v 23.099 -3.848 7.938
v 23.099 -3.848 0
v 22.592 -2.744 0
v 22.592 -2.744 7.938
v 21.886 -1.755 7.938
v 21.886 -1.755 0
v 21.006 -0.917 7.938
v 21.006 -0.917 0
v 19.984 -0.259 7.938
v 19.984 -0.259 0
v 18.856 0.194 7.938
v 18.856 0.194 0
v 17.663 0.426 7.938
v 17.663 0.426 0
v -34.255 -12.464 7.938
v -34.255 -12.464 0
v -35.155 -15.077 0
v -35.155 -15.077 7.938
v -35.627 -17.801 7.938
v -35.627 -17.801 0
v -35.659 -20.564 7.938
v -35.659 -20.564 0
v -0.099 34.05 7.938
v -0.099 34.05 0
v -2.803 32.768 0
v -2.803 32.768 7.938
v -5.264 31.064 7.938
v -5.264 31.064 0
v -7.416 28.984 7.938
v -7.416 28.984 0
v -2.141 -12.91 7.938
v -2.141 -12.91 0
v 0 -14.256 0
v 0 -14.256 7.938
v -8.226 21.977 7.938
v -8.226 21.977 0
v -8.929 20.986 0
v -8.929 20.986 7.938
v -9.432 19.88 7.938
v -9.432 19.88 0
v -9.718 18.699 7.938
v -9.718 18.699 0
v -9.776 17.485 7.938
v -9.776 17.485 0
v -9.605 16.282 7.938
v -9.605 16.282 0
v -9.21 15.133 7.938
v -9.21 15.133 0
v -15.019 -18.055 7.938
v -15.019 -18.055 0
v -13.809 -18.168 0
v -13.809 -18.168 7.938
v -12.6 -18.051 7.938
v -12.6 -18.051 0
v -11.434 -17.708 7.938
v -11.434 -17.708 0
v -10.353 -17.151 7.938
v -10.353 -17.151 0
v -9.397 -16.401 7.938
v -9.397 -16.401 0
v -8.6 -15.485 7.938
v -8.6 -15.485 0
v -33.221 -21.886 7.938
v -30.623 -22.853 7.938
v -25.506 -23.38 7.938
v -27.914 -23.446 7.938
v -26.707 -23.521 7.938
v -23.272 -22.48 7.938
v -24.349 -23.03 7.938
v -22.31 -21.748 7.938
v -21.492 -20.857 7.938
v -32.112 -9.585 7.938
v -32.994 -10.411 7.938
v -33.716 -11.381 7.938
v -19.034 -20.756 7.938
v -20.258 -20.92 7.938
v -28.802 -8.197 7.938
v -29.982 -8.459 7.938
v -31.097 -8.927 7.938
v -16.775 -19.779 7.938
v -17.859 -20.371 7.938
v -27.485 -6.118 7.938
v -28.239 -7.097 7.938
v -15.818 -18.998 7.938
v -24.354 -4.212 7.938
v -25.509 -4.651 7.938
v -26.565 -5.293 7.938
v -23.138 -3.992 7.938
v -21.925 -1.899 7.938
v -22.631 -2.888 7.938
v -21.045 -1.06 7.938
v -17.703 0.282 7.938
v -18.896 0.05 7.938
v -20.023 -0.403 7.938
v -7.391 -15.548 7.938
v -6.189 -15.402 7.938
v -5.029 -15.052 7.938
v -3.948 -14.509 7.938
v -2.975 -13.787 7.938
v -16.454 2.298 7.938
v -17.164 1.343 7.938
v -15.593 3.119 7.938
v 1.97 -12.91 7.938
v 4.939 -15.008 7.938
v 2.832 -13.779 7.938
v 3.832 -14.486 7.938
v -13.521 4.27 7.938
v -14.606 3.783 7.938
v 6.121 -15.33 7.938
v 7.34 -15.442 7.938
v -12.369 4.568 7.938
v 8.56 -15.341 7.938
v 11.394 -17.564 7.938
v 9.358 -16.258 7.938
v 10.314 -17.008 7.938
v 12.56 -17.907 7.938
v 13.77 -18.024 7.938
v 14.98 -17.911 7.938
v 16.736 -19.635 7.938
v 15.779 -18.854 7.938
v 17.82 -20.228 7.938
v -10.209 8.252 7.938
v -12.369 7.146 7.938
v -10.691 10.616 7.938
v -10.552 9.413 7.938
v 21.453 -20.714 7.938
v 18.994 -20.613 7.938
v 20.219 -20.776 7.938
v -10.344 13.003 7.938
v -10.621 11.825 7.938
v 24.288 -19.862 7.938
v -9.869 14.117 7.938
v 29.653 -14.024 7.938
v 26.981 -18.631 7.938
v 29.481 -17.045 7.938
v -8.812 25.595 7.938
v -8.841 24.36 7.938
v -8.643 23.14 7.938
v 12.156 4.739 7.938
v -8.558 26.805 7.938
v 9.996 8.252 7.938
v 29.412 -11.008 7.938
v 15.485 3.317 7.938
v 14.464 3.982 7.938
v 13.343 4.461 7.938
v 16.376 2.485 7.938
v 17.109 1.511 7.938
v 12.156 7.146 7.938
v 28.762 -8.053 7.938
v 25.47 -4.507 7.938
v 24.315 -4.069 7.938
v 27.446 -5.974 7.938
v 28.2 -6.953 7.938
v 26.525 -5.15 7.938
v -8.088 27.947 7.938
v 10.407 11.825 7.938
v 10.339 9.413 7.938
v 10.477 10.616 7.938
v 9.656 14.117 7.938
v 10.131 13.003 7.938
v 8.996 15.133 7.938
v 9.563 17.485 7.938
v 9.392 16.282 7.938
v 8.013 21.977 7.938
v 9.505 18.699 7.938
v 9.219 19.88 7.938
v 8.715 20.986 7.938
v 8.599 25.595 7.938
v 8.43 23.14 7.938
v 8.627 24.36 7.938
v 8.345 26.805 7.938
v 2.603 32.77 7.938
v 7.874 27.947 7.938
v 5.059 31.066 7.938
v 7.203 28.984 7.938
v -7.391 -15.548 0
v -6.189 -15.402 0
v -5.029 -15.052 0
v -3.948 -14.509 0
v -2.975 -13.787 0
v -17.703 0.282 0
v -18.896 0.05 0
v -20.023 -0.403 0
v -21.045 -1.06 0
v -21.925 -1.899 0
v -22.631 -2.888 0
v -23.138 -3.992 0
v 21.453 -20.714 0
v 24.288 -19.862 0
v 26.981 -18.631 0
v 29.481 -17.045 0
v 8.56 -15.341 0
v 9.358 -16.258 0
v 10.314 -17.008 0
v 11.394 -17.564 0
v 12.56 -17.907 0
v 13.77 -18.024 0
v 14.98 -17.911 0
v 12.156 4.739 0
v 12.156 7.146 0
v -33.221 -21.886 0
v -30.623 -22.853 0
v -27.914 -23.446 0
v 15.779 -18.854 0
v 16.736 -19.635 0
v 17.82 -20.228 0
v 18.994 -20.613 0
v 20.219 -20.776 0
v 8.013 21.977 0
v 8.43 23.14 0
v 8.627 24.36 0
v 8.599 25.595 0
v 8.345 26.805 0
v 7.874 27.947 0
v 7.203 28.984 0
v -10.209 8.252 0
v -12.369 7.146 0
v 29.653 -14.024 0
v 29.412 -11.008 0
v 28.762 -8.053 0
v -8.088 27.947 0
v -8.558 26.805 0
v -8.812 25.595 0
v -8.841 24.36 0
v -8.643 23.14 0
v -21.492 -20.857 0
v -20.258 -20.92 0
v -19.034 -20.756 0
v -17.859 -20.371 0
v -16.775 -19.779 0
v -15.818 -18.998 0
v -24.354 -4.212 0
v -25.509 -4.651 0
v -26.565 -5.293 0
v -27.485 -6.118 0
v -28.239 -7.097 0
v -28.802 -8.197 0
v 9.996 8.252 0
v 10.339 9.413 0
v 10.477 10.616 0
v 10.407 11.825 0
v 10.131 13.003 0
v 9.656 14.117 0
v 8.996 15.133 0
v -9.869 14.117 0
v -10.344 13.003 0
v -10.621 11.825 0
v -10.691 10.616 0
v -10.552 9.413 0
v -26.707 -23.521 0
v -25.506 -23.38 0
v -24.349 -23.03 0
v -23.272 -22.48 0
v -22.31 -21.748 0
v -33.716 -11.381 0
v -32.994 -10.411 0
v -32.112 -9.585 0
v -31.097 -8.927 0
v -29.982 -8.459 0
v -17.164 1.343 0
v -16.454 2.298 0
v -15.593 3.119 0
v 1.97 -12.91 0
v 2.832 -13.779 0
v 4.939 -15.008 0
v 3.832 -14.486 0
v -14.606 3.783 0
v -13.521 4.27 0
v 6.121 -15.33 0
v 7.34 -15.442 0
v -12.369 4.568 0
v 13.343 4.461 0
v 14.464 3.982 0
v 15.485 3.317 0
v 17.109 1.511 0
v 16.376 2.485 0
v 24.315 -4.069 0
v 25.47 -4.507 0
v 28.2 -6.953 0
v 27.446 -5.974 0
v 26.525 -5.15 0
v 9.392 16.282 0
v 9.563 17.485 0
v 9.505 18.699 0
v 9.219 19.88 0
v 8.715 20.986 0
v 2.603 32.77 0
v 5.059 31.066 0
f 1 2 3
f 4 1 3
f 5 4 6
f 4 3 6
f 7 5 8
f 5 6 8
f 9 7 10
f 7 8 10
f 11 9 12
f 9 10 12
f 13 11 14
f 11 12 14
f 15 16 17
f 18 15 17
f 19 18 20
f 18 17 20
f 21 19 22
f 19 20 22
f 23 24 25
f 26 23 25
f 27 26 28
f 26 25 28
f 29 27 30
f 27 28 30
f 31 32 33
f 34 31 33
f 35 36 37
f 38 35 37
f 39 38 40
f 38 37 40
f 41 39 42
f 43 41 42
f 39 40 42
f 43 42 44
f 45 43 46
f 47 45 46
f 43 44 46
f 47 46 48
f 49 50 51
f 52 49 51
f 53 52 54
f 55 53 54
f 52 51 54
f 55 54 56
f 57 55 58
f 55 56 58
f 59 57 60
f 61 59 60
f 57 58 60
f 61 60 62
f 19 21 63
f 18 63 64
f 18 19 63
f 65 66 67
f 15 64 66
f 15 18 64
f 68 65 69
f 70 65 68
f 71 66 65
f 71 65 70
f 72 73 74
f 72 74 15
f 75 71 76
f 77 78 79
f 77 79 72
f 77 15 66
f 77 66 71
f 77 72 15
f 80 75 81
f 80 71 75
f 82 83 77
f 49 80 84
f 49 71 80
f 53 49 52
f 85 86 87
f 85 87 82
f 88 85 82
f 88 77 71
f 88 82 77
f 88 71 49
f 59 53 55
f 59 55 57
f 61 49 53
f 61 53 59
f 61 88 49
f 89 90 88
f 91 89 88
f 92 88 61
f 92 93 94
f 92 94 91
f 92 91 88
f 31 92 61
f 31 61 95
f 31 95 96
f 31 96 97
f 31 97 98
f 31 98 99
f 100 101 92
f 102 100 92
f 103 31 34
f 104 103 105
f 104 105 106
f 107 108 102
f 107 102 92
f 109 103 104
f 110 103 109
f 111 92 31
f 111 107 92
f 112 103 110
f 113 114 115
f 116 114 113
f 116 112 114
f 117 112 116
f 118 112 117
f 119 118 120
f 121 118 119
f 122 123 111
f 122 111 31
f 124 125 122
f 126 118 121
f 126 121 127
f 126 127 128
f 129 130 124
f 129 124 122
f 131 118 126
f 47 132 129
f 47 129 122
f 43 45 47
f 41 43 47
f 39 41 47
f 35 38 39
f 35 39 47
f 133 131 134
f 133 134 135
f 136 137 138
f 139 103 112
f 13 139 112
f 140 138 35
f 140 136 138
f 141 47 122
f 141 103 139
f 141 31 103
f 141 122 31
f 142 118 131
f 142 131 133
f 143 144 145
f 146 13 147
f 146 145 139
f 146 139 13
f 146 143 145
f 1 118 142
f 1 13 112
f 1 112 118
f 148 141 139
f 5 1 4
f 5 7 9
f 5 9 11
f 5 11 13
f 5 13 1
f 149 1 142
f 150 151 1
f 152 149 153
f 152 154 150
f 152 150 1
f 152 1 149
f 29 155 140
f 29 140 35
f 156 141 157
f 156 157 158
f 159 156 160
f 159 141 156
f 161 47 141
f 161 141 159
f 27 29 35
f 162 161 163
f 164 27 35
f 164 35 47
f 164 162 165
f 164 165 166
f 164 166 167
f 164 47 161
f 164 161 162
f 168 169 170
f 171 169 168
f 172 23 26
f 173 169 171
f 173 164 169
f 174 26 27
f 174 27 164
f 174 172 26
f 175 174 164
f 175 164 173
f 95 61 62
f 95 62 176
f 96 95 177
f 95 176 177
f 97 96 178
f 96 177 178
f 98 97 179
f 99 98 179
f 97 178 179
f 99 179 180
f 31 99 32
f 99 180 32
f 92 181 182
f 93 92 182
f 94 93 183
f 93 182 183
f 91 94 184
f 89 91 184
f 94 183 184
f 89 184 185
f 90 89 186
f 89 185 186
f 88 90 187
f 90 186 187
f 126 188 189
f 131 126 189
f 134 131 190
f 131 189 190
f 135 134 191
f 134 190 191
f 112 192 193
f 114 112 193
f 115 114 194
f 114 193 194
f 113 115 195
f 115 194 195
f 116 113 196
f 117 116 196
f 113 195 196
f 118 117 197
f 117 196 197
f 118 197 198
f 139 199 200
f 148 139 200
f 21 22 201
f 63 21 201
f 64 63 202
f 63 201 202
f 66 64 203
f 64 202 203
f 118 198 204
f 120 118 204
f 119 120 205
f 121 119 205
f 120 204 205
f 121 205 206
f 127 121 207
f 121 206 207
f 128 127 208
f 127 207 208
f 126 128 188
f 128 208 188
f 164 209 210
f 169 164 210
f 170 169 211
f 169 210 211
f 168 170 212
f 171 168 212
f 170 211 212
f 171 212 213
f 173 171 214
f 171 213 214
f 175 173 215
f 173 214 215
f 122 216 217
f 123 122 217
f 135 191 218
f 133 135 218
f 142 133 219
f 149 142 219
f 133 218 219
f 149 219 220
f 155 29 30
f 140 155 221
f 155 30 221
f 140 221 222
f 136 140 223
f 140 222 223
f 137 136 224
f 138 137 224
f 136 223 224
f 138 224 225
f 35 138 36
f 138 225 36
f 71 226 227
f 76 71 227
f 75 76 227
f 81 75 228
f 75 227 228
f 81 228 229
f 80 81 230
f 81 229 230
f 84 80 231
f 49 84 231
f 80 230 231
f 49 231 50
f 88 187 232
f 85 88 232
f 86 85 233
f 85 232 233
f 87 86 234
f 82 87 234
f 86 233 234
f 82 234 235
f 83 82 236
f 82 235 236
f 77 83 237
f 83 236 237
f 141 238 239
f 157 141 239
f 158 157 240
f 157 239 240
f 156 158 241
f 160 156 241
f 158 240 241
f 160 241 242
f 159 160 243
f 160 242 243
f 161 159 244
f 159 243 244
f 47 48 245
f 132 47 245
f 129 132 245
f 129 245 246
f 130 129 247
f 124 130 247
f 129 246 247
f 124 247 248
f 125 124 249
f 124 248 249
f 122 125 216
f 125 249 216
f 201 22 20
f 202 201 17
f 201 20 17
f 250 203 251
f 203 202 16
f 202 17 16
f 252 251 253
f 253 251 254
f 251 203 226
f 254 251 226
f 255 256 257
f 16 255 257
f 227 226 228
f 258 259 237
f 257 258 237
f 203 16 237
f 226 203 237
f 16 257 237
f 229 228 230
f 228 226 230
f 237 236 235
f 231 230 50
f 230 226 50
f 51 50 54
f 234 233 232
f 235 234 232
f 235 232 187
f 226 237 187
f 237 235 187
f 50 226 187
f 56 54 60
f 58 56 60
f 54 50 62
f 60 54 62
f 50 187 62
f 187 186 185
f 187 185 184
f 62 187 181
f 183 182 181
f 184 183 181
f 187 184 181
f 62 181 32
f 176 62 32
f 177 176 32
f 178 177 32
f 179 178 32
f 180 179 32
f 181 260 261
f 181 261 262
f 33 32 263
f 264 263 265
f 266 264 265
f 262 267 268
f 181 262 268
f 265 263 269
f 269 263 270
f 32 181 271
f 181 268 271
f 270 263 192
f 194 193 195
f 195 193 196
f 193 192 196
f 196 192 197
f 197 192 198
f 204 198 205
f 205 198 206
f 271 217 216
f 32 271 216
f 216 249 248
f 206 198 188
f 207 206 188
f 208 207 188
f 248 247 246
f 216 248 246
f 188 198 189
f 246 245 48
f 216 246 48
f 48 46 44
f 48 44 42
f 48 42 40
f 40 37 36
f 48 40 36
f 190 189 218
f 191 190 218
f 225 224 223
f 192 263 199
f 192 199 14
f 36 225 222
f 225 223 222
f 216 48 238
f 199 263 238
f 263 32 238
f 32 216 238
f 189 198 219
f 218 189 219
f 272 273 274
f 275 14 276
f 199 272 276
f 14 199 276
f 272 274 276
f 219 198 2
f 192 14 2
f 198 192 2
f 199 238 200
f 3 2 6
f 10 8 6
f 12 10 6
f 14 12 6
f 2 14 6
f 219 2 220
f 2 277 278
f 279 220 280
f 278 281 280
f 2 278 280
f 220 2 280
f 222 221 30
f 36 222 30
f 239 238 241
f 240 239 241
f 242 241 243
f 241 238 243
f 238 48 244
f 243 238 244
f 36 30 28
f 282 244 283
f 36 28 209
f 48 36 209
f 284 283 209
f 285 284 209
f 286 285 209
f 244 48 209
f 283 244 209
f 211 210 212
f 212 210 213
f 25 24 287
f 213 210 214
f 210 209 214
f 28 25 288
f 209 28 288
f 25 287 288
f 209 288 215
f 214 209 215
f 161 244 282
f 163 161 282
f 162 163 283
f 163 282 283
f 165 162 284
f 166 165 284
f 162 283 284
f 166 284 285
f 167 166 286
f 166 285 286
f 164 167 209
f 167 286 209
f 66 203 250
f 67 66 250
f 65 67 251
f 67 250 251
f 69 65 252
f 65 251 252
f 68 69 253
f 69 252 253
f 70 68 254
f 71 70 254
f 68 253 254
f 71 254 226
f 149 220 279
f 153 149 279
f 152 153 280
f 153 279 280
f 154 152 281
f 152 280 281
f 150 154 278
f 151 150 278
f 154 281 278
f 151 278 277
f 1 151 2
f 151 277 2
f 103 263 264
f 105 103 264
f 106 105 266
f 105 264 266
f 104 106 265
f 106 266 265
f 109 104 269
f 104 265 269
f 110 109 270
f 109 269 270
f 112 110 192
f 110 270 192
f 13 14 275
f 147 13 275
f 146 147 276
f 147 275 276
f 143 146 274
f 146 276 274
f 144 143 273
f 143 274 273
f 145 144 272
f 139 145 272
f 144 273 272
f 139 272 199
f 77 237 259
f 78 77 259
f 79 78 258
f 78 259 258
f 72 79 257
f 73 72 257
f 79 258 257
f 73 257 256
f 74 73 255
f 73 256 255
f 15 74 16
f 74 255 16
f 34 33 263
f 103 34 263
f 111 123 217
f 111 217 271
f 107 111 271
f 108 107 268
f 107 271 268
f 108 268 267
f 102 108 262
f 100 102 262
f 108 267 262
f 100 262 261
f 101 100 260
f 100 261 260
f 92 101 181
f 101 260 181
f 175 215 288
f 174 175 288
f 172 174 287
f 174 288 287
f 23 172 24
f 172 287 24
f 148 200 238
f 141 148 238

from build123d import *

# Parameters (mm, degrees)
F1_DEPTH = 7.9375


# Not quite as in the source:
# - a length typed as a fraction of an inch, garbled in the dataset ("3 / 203.2 mm" for 3/8 in), is restored


with BuildPart() as f1:
    # F0 (on Top) → F1 (new body)
    with BuildSketch(Plane.XY):
        with BuildLine():
            ThreePointArc((-0.0986067535, 34.0497419238), (-4.0682176485, 31.9659465467), (-7.4162920937, 28.9842672646))
            ThreePointArc((-7.4162920937, 28.9842672646), (-8.8119305122, 25.5953281623), (-8.2258973271, 21.977417171))
            ThreePointArc((-8.2258973271, 21.977417171), (-9.7181261566, 18.698842434), (-9.2097157612, 15.1327075437))
            ThreePointArc((-9.2097157612, 15.1327075437), (-10.6205392688, 11.8246856933), (-10.2093555033, 8.2519613206))
            Line((-10.2093555033, 8.2519613206), (-12.369341217, 7.1464567445))
            Line((-12.369341217, 7.1464567445), (-12.369341217, 4.6386048198))
            Line((-12.369341217, 4.6386048198), (-12.369341217, 4.5682978211))
            ThreePointArc((-12.369341217, 4.5682978211), (-15.5930977879, 3.1185654947), (-17.7027139134, 0.2823972963))
            ThreePointArc((-17.7027139134, 0.2823972963), (-21.0452825194, -1.0603738309), (-23.1384971151, -3.9919692741))
            ThreePointArc((-23.1384971151, -3.9919692741), (-26.5647165348, -5.2934051439), (-28.80180468, -8.19653302))
            ThreePointArc((-28.80180468, -8.19653302), (-32.1117440701, -9.5846599904), (-34.254974256, -12.4637500588))
            ThreePointArc((-34.254974256, -12.4637500588), (-35.4454588739, -16.4293701566), (-35.6585793197, -20.564340055))
            ThreePointArc((-35.6585793197, -20.564340055), (-31.9389059128, -22.4150036937), (-27.9142765499, -23.4461606411))
            ThreePointArc((-27.9142765499, -23.4461606411), (-24.3492963179, -23.0296138883), (-21.4921734029, -20.8571857766))
            ThreePointArc((-21.4921734029, -20.8571857766), (-17.8594468391, -20.3713745504), (-15.0192606046, -18.054899429))
            ThreePointArc((-15.0192606046, -18.054899429), (-11.4338171794, -17.7079201351), (-8.5996589687, -15.484556372))
            ThreePointArc((-8.5996589687, -15.484556372), (-5.0294162563, -15.0523544446), (-2.1409380715, -12.9098966718))
            Line((-2.1409380715, -12.9098966718), (0, -14.2561570176))
            Line((0, -14.2561570176), (1.9696742658, -12.9098966718))
            ThreePointArc((1.9696742658, -12.9098966718), (4.9392756736, -15.0084468105), (8.560301624, -15.3410370587))
            ThreePointArc((8.560301624, -15.3410370587), (11.3944598347, -17.5644008218), (14.9799032599, -17.9113801157))
            ThreePointArc((14.9799032599, -17.9113801157), (17.8200894944, -20.2278552371), (21.4528160582, -20.7136664634))
            ThreePointArc((21.4528160582, -20.7136664634), (25.6558468929, -19.2922500665), (29.4813849032, -17.0447733253))
            ThreePointArc((29.4813849032, -17.0447733253), (29.5836204245, -12.511977875), (28.7624473353, -8.0530137067))
            ThreePointArc((28.7624473353, -8.0530137067), (26.5253591901, -5.1498858306), (23.0991397704, -3.8484499608))
            ThreePointArc((23.0991397704, -3.8484499608), (21.0059251747, -0.9168545176), (17.6633565687, 0.4259166096))
            ThreePointArc((17.6633565687, 0.4259166096), (15.4847616458, 3.3168082822), (12.1560195839, 4.739132713))
            Line((12.1560195839, 4.739132713), (12.1560195839, 7.1464567445))
            Line((12.1560195839, 7.1464567445), (9.9960338703, 8.2519613206))
            ThreePointArc((9.9960338703, 8.2519613206), (10.4072176357, 11.8246856933), (8.9963941282, 15.1327075437))
            ThreePointArc((8.9963941282, 15.1327075437), (9.5048045235, 18.698842434), (8.012575694, 21.977417171))
            ThreePointArc((8.012575694, 21.977417171), (8.5986088792, 25.5953281623), (7.2029704606, 28.9842672646))
            ThreePointArc((7.2029704606, 28.9842672646), (3.8655773676, 31.9687453881), (-0.0986067535, 34.0497419238))
        make_face()
    extrude(amount=F1_DEPTH)


solid = f1.part
